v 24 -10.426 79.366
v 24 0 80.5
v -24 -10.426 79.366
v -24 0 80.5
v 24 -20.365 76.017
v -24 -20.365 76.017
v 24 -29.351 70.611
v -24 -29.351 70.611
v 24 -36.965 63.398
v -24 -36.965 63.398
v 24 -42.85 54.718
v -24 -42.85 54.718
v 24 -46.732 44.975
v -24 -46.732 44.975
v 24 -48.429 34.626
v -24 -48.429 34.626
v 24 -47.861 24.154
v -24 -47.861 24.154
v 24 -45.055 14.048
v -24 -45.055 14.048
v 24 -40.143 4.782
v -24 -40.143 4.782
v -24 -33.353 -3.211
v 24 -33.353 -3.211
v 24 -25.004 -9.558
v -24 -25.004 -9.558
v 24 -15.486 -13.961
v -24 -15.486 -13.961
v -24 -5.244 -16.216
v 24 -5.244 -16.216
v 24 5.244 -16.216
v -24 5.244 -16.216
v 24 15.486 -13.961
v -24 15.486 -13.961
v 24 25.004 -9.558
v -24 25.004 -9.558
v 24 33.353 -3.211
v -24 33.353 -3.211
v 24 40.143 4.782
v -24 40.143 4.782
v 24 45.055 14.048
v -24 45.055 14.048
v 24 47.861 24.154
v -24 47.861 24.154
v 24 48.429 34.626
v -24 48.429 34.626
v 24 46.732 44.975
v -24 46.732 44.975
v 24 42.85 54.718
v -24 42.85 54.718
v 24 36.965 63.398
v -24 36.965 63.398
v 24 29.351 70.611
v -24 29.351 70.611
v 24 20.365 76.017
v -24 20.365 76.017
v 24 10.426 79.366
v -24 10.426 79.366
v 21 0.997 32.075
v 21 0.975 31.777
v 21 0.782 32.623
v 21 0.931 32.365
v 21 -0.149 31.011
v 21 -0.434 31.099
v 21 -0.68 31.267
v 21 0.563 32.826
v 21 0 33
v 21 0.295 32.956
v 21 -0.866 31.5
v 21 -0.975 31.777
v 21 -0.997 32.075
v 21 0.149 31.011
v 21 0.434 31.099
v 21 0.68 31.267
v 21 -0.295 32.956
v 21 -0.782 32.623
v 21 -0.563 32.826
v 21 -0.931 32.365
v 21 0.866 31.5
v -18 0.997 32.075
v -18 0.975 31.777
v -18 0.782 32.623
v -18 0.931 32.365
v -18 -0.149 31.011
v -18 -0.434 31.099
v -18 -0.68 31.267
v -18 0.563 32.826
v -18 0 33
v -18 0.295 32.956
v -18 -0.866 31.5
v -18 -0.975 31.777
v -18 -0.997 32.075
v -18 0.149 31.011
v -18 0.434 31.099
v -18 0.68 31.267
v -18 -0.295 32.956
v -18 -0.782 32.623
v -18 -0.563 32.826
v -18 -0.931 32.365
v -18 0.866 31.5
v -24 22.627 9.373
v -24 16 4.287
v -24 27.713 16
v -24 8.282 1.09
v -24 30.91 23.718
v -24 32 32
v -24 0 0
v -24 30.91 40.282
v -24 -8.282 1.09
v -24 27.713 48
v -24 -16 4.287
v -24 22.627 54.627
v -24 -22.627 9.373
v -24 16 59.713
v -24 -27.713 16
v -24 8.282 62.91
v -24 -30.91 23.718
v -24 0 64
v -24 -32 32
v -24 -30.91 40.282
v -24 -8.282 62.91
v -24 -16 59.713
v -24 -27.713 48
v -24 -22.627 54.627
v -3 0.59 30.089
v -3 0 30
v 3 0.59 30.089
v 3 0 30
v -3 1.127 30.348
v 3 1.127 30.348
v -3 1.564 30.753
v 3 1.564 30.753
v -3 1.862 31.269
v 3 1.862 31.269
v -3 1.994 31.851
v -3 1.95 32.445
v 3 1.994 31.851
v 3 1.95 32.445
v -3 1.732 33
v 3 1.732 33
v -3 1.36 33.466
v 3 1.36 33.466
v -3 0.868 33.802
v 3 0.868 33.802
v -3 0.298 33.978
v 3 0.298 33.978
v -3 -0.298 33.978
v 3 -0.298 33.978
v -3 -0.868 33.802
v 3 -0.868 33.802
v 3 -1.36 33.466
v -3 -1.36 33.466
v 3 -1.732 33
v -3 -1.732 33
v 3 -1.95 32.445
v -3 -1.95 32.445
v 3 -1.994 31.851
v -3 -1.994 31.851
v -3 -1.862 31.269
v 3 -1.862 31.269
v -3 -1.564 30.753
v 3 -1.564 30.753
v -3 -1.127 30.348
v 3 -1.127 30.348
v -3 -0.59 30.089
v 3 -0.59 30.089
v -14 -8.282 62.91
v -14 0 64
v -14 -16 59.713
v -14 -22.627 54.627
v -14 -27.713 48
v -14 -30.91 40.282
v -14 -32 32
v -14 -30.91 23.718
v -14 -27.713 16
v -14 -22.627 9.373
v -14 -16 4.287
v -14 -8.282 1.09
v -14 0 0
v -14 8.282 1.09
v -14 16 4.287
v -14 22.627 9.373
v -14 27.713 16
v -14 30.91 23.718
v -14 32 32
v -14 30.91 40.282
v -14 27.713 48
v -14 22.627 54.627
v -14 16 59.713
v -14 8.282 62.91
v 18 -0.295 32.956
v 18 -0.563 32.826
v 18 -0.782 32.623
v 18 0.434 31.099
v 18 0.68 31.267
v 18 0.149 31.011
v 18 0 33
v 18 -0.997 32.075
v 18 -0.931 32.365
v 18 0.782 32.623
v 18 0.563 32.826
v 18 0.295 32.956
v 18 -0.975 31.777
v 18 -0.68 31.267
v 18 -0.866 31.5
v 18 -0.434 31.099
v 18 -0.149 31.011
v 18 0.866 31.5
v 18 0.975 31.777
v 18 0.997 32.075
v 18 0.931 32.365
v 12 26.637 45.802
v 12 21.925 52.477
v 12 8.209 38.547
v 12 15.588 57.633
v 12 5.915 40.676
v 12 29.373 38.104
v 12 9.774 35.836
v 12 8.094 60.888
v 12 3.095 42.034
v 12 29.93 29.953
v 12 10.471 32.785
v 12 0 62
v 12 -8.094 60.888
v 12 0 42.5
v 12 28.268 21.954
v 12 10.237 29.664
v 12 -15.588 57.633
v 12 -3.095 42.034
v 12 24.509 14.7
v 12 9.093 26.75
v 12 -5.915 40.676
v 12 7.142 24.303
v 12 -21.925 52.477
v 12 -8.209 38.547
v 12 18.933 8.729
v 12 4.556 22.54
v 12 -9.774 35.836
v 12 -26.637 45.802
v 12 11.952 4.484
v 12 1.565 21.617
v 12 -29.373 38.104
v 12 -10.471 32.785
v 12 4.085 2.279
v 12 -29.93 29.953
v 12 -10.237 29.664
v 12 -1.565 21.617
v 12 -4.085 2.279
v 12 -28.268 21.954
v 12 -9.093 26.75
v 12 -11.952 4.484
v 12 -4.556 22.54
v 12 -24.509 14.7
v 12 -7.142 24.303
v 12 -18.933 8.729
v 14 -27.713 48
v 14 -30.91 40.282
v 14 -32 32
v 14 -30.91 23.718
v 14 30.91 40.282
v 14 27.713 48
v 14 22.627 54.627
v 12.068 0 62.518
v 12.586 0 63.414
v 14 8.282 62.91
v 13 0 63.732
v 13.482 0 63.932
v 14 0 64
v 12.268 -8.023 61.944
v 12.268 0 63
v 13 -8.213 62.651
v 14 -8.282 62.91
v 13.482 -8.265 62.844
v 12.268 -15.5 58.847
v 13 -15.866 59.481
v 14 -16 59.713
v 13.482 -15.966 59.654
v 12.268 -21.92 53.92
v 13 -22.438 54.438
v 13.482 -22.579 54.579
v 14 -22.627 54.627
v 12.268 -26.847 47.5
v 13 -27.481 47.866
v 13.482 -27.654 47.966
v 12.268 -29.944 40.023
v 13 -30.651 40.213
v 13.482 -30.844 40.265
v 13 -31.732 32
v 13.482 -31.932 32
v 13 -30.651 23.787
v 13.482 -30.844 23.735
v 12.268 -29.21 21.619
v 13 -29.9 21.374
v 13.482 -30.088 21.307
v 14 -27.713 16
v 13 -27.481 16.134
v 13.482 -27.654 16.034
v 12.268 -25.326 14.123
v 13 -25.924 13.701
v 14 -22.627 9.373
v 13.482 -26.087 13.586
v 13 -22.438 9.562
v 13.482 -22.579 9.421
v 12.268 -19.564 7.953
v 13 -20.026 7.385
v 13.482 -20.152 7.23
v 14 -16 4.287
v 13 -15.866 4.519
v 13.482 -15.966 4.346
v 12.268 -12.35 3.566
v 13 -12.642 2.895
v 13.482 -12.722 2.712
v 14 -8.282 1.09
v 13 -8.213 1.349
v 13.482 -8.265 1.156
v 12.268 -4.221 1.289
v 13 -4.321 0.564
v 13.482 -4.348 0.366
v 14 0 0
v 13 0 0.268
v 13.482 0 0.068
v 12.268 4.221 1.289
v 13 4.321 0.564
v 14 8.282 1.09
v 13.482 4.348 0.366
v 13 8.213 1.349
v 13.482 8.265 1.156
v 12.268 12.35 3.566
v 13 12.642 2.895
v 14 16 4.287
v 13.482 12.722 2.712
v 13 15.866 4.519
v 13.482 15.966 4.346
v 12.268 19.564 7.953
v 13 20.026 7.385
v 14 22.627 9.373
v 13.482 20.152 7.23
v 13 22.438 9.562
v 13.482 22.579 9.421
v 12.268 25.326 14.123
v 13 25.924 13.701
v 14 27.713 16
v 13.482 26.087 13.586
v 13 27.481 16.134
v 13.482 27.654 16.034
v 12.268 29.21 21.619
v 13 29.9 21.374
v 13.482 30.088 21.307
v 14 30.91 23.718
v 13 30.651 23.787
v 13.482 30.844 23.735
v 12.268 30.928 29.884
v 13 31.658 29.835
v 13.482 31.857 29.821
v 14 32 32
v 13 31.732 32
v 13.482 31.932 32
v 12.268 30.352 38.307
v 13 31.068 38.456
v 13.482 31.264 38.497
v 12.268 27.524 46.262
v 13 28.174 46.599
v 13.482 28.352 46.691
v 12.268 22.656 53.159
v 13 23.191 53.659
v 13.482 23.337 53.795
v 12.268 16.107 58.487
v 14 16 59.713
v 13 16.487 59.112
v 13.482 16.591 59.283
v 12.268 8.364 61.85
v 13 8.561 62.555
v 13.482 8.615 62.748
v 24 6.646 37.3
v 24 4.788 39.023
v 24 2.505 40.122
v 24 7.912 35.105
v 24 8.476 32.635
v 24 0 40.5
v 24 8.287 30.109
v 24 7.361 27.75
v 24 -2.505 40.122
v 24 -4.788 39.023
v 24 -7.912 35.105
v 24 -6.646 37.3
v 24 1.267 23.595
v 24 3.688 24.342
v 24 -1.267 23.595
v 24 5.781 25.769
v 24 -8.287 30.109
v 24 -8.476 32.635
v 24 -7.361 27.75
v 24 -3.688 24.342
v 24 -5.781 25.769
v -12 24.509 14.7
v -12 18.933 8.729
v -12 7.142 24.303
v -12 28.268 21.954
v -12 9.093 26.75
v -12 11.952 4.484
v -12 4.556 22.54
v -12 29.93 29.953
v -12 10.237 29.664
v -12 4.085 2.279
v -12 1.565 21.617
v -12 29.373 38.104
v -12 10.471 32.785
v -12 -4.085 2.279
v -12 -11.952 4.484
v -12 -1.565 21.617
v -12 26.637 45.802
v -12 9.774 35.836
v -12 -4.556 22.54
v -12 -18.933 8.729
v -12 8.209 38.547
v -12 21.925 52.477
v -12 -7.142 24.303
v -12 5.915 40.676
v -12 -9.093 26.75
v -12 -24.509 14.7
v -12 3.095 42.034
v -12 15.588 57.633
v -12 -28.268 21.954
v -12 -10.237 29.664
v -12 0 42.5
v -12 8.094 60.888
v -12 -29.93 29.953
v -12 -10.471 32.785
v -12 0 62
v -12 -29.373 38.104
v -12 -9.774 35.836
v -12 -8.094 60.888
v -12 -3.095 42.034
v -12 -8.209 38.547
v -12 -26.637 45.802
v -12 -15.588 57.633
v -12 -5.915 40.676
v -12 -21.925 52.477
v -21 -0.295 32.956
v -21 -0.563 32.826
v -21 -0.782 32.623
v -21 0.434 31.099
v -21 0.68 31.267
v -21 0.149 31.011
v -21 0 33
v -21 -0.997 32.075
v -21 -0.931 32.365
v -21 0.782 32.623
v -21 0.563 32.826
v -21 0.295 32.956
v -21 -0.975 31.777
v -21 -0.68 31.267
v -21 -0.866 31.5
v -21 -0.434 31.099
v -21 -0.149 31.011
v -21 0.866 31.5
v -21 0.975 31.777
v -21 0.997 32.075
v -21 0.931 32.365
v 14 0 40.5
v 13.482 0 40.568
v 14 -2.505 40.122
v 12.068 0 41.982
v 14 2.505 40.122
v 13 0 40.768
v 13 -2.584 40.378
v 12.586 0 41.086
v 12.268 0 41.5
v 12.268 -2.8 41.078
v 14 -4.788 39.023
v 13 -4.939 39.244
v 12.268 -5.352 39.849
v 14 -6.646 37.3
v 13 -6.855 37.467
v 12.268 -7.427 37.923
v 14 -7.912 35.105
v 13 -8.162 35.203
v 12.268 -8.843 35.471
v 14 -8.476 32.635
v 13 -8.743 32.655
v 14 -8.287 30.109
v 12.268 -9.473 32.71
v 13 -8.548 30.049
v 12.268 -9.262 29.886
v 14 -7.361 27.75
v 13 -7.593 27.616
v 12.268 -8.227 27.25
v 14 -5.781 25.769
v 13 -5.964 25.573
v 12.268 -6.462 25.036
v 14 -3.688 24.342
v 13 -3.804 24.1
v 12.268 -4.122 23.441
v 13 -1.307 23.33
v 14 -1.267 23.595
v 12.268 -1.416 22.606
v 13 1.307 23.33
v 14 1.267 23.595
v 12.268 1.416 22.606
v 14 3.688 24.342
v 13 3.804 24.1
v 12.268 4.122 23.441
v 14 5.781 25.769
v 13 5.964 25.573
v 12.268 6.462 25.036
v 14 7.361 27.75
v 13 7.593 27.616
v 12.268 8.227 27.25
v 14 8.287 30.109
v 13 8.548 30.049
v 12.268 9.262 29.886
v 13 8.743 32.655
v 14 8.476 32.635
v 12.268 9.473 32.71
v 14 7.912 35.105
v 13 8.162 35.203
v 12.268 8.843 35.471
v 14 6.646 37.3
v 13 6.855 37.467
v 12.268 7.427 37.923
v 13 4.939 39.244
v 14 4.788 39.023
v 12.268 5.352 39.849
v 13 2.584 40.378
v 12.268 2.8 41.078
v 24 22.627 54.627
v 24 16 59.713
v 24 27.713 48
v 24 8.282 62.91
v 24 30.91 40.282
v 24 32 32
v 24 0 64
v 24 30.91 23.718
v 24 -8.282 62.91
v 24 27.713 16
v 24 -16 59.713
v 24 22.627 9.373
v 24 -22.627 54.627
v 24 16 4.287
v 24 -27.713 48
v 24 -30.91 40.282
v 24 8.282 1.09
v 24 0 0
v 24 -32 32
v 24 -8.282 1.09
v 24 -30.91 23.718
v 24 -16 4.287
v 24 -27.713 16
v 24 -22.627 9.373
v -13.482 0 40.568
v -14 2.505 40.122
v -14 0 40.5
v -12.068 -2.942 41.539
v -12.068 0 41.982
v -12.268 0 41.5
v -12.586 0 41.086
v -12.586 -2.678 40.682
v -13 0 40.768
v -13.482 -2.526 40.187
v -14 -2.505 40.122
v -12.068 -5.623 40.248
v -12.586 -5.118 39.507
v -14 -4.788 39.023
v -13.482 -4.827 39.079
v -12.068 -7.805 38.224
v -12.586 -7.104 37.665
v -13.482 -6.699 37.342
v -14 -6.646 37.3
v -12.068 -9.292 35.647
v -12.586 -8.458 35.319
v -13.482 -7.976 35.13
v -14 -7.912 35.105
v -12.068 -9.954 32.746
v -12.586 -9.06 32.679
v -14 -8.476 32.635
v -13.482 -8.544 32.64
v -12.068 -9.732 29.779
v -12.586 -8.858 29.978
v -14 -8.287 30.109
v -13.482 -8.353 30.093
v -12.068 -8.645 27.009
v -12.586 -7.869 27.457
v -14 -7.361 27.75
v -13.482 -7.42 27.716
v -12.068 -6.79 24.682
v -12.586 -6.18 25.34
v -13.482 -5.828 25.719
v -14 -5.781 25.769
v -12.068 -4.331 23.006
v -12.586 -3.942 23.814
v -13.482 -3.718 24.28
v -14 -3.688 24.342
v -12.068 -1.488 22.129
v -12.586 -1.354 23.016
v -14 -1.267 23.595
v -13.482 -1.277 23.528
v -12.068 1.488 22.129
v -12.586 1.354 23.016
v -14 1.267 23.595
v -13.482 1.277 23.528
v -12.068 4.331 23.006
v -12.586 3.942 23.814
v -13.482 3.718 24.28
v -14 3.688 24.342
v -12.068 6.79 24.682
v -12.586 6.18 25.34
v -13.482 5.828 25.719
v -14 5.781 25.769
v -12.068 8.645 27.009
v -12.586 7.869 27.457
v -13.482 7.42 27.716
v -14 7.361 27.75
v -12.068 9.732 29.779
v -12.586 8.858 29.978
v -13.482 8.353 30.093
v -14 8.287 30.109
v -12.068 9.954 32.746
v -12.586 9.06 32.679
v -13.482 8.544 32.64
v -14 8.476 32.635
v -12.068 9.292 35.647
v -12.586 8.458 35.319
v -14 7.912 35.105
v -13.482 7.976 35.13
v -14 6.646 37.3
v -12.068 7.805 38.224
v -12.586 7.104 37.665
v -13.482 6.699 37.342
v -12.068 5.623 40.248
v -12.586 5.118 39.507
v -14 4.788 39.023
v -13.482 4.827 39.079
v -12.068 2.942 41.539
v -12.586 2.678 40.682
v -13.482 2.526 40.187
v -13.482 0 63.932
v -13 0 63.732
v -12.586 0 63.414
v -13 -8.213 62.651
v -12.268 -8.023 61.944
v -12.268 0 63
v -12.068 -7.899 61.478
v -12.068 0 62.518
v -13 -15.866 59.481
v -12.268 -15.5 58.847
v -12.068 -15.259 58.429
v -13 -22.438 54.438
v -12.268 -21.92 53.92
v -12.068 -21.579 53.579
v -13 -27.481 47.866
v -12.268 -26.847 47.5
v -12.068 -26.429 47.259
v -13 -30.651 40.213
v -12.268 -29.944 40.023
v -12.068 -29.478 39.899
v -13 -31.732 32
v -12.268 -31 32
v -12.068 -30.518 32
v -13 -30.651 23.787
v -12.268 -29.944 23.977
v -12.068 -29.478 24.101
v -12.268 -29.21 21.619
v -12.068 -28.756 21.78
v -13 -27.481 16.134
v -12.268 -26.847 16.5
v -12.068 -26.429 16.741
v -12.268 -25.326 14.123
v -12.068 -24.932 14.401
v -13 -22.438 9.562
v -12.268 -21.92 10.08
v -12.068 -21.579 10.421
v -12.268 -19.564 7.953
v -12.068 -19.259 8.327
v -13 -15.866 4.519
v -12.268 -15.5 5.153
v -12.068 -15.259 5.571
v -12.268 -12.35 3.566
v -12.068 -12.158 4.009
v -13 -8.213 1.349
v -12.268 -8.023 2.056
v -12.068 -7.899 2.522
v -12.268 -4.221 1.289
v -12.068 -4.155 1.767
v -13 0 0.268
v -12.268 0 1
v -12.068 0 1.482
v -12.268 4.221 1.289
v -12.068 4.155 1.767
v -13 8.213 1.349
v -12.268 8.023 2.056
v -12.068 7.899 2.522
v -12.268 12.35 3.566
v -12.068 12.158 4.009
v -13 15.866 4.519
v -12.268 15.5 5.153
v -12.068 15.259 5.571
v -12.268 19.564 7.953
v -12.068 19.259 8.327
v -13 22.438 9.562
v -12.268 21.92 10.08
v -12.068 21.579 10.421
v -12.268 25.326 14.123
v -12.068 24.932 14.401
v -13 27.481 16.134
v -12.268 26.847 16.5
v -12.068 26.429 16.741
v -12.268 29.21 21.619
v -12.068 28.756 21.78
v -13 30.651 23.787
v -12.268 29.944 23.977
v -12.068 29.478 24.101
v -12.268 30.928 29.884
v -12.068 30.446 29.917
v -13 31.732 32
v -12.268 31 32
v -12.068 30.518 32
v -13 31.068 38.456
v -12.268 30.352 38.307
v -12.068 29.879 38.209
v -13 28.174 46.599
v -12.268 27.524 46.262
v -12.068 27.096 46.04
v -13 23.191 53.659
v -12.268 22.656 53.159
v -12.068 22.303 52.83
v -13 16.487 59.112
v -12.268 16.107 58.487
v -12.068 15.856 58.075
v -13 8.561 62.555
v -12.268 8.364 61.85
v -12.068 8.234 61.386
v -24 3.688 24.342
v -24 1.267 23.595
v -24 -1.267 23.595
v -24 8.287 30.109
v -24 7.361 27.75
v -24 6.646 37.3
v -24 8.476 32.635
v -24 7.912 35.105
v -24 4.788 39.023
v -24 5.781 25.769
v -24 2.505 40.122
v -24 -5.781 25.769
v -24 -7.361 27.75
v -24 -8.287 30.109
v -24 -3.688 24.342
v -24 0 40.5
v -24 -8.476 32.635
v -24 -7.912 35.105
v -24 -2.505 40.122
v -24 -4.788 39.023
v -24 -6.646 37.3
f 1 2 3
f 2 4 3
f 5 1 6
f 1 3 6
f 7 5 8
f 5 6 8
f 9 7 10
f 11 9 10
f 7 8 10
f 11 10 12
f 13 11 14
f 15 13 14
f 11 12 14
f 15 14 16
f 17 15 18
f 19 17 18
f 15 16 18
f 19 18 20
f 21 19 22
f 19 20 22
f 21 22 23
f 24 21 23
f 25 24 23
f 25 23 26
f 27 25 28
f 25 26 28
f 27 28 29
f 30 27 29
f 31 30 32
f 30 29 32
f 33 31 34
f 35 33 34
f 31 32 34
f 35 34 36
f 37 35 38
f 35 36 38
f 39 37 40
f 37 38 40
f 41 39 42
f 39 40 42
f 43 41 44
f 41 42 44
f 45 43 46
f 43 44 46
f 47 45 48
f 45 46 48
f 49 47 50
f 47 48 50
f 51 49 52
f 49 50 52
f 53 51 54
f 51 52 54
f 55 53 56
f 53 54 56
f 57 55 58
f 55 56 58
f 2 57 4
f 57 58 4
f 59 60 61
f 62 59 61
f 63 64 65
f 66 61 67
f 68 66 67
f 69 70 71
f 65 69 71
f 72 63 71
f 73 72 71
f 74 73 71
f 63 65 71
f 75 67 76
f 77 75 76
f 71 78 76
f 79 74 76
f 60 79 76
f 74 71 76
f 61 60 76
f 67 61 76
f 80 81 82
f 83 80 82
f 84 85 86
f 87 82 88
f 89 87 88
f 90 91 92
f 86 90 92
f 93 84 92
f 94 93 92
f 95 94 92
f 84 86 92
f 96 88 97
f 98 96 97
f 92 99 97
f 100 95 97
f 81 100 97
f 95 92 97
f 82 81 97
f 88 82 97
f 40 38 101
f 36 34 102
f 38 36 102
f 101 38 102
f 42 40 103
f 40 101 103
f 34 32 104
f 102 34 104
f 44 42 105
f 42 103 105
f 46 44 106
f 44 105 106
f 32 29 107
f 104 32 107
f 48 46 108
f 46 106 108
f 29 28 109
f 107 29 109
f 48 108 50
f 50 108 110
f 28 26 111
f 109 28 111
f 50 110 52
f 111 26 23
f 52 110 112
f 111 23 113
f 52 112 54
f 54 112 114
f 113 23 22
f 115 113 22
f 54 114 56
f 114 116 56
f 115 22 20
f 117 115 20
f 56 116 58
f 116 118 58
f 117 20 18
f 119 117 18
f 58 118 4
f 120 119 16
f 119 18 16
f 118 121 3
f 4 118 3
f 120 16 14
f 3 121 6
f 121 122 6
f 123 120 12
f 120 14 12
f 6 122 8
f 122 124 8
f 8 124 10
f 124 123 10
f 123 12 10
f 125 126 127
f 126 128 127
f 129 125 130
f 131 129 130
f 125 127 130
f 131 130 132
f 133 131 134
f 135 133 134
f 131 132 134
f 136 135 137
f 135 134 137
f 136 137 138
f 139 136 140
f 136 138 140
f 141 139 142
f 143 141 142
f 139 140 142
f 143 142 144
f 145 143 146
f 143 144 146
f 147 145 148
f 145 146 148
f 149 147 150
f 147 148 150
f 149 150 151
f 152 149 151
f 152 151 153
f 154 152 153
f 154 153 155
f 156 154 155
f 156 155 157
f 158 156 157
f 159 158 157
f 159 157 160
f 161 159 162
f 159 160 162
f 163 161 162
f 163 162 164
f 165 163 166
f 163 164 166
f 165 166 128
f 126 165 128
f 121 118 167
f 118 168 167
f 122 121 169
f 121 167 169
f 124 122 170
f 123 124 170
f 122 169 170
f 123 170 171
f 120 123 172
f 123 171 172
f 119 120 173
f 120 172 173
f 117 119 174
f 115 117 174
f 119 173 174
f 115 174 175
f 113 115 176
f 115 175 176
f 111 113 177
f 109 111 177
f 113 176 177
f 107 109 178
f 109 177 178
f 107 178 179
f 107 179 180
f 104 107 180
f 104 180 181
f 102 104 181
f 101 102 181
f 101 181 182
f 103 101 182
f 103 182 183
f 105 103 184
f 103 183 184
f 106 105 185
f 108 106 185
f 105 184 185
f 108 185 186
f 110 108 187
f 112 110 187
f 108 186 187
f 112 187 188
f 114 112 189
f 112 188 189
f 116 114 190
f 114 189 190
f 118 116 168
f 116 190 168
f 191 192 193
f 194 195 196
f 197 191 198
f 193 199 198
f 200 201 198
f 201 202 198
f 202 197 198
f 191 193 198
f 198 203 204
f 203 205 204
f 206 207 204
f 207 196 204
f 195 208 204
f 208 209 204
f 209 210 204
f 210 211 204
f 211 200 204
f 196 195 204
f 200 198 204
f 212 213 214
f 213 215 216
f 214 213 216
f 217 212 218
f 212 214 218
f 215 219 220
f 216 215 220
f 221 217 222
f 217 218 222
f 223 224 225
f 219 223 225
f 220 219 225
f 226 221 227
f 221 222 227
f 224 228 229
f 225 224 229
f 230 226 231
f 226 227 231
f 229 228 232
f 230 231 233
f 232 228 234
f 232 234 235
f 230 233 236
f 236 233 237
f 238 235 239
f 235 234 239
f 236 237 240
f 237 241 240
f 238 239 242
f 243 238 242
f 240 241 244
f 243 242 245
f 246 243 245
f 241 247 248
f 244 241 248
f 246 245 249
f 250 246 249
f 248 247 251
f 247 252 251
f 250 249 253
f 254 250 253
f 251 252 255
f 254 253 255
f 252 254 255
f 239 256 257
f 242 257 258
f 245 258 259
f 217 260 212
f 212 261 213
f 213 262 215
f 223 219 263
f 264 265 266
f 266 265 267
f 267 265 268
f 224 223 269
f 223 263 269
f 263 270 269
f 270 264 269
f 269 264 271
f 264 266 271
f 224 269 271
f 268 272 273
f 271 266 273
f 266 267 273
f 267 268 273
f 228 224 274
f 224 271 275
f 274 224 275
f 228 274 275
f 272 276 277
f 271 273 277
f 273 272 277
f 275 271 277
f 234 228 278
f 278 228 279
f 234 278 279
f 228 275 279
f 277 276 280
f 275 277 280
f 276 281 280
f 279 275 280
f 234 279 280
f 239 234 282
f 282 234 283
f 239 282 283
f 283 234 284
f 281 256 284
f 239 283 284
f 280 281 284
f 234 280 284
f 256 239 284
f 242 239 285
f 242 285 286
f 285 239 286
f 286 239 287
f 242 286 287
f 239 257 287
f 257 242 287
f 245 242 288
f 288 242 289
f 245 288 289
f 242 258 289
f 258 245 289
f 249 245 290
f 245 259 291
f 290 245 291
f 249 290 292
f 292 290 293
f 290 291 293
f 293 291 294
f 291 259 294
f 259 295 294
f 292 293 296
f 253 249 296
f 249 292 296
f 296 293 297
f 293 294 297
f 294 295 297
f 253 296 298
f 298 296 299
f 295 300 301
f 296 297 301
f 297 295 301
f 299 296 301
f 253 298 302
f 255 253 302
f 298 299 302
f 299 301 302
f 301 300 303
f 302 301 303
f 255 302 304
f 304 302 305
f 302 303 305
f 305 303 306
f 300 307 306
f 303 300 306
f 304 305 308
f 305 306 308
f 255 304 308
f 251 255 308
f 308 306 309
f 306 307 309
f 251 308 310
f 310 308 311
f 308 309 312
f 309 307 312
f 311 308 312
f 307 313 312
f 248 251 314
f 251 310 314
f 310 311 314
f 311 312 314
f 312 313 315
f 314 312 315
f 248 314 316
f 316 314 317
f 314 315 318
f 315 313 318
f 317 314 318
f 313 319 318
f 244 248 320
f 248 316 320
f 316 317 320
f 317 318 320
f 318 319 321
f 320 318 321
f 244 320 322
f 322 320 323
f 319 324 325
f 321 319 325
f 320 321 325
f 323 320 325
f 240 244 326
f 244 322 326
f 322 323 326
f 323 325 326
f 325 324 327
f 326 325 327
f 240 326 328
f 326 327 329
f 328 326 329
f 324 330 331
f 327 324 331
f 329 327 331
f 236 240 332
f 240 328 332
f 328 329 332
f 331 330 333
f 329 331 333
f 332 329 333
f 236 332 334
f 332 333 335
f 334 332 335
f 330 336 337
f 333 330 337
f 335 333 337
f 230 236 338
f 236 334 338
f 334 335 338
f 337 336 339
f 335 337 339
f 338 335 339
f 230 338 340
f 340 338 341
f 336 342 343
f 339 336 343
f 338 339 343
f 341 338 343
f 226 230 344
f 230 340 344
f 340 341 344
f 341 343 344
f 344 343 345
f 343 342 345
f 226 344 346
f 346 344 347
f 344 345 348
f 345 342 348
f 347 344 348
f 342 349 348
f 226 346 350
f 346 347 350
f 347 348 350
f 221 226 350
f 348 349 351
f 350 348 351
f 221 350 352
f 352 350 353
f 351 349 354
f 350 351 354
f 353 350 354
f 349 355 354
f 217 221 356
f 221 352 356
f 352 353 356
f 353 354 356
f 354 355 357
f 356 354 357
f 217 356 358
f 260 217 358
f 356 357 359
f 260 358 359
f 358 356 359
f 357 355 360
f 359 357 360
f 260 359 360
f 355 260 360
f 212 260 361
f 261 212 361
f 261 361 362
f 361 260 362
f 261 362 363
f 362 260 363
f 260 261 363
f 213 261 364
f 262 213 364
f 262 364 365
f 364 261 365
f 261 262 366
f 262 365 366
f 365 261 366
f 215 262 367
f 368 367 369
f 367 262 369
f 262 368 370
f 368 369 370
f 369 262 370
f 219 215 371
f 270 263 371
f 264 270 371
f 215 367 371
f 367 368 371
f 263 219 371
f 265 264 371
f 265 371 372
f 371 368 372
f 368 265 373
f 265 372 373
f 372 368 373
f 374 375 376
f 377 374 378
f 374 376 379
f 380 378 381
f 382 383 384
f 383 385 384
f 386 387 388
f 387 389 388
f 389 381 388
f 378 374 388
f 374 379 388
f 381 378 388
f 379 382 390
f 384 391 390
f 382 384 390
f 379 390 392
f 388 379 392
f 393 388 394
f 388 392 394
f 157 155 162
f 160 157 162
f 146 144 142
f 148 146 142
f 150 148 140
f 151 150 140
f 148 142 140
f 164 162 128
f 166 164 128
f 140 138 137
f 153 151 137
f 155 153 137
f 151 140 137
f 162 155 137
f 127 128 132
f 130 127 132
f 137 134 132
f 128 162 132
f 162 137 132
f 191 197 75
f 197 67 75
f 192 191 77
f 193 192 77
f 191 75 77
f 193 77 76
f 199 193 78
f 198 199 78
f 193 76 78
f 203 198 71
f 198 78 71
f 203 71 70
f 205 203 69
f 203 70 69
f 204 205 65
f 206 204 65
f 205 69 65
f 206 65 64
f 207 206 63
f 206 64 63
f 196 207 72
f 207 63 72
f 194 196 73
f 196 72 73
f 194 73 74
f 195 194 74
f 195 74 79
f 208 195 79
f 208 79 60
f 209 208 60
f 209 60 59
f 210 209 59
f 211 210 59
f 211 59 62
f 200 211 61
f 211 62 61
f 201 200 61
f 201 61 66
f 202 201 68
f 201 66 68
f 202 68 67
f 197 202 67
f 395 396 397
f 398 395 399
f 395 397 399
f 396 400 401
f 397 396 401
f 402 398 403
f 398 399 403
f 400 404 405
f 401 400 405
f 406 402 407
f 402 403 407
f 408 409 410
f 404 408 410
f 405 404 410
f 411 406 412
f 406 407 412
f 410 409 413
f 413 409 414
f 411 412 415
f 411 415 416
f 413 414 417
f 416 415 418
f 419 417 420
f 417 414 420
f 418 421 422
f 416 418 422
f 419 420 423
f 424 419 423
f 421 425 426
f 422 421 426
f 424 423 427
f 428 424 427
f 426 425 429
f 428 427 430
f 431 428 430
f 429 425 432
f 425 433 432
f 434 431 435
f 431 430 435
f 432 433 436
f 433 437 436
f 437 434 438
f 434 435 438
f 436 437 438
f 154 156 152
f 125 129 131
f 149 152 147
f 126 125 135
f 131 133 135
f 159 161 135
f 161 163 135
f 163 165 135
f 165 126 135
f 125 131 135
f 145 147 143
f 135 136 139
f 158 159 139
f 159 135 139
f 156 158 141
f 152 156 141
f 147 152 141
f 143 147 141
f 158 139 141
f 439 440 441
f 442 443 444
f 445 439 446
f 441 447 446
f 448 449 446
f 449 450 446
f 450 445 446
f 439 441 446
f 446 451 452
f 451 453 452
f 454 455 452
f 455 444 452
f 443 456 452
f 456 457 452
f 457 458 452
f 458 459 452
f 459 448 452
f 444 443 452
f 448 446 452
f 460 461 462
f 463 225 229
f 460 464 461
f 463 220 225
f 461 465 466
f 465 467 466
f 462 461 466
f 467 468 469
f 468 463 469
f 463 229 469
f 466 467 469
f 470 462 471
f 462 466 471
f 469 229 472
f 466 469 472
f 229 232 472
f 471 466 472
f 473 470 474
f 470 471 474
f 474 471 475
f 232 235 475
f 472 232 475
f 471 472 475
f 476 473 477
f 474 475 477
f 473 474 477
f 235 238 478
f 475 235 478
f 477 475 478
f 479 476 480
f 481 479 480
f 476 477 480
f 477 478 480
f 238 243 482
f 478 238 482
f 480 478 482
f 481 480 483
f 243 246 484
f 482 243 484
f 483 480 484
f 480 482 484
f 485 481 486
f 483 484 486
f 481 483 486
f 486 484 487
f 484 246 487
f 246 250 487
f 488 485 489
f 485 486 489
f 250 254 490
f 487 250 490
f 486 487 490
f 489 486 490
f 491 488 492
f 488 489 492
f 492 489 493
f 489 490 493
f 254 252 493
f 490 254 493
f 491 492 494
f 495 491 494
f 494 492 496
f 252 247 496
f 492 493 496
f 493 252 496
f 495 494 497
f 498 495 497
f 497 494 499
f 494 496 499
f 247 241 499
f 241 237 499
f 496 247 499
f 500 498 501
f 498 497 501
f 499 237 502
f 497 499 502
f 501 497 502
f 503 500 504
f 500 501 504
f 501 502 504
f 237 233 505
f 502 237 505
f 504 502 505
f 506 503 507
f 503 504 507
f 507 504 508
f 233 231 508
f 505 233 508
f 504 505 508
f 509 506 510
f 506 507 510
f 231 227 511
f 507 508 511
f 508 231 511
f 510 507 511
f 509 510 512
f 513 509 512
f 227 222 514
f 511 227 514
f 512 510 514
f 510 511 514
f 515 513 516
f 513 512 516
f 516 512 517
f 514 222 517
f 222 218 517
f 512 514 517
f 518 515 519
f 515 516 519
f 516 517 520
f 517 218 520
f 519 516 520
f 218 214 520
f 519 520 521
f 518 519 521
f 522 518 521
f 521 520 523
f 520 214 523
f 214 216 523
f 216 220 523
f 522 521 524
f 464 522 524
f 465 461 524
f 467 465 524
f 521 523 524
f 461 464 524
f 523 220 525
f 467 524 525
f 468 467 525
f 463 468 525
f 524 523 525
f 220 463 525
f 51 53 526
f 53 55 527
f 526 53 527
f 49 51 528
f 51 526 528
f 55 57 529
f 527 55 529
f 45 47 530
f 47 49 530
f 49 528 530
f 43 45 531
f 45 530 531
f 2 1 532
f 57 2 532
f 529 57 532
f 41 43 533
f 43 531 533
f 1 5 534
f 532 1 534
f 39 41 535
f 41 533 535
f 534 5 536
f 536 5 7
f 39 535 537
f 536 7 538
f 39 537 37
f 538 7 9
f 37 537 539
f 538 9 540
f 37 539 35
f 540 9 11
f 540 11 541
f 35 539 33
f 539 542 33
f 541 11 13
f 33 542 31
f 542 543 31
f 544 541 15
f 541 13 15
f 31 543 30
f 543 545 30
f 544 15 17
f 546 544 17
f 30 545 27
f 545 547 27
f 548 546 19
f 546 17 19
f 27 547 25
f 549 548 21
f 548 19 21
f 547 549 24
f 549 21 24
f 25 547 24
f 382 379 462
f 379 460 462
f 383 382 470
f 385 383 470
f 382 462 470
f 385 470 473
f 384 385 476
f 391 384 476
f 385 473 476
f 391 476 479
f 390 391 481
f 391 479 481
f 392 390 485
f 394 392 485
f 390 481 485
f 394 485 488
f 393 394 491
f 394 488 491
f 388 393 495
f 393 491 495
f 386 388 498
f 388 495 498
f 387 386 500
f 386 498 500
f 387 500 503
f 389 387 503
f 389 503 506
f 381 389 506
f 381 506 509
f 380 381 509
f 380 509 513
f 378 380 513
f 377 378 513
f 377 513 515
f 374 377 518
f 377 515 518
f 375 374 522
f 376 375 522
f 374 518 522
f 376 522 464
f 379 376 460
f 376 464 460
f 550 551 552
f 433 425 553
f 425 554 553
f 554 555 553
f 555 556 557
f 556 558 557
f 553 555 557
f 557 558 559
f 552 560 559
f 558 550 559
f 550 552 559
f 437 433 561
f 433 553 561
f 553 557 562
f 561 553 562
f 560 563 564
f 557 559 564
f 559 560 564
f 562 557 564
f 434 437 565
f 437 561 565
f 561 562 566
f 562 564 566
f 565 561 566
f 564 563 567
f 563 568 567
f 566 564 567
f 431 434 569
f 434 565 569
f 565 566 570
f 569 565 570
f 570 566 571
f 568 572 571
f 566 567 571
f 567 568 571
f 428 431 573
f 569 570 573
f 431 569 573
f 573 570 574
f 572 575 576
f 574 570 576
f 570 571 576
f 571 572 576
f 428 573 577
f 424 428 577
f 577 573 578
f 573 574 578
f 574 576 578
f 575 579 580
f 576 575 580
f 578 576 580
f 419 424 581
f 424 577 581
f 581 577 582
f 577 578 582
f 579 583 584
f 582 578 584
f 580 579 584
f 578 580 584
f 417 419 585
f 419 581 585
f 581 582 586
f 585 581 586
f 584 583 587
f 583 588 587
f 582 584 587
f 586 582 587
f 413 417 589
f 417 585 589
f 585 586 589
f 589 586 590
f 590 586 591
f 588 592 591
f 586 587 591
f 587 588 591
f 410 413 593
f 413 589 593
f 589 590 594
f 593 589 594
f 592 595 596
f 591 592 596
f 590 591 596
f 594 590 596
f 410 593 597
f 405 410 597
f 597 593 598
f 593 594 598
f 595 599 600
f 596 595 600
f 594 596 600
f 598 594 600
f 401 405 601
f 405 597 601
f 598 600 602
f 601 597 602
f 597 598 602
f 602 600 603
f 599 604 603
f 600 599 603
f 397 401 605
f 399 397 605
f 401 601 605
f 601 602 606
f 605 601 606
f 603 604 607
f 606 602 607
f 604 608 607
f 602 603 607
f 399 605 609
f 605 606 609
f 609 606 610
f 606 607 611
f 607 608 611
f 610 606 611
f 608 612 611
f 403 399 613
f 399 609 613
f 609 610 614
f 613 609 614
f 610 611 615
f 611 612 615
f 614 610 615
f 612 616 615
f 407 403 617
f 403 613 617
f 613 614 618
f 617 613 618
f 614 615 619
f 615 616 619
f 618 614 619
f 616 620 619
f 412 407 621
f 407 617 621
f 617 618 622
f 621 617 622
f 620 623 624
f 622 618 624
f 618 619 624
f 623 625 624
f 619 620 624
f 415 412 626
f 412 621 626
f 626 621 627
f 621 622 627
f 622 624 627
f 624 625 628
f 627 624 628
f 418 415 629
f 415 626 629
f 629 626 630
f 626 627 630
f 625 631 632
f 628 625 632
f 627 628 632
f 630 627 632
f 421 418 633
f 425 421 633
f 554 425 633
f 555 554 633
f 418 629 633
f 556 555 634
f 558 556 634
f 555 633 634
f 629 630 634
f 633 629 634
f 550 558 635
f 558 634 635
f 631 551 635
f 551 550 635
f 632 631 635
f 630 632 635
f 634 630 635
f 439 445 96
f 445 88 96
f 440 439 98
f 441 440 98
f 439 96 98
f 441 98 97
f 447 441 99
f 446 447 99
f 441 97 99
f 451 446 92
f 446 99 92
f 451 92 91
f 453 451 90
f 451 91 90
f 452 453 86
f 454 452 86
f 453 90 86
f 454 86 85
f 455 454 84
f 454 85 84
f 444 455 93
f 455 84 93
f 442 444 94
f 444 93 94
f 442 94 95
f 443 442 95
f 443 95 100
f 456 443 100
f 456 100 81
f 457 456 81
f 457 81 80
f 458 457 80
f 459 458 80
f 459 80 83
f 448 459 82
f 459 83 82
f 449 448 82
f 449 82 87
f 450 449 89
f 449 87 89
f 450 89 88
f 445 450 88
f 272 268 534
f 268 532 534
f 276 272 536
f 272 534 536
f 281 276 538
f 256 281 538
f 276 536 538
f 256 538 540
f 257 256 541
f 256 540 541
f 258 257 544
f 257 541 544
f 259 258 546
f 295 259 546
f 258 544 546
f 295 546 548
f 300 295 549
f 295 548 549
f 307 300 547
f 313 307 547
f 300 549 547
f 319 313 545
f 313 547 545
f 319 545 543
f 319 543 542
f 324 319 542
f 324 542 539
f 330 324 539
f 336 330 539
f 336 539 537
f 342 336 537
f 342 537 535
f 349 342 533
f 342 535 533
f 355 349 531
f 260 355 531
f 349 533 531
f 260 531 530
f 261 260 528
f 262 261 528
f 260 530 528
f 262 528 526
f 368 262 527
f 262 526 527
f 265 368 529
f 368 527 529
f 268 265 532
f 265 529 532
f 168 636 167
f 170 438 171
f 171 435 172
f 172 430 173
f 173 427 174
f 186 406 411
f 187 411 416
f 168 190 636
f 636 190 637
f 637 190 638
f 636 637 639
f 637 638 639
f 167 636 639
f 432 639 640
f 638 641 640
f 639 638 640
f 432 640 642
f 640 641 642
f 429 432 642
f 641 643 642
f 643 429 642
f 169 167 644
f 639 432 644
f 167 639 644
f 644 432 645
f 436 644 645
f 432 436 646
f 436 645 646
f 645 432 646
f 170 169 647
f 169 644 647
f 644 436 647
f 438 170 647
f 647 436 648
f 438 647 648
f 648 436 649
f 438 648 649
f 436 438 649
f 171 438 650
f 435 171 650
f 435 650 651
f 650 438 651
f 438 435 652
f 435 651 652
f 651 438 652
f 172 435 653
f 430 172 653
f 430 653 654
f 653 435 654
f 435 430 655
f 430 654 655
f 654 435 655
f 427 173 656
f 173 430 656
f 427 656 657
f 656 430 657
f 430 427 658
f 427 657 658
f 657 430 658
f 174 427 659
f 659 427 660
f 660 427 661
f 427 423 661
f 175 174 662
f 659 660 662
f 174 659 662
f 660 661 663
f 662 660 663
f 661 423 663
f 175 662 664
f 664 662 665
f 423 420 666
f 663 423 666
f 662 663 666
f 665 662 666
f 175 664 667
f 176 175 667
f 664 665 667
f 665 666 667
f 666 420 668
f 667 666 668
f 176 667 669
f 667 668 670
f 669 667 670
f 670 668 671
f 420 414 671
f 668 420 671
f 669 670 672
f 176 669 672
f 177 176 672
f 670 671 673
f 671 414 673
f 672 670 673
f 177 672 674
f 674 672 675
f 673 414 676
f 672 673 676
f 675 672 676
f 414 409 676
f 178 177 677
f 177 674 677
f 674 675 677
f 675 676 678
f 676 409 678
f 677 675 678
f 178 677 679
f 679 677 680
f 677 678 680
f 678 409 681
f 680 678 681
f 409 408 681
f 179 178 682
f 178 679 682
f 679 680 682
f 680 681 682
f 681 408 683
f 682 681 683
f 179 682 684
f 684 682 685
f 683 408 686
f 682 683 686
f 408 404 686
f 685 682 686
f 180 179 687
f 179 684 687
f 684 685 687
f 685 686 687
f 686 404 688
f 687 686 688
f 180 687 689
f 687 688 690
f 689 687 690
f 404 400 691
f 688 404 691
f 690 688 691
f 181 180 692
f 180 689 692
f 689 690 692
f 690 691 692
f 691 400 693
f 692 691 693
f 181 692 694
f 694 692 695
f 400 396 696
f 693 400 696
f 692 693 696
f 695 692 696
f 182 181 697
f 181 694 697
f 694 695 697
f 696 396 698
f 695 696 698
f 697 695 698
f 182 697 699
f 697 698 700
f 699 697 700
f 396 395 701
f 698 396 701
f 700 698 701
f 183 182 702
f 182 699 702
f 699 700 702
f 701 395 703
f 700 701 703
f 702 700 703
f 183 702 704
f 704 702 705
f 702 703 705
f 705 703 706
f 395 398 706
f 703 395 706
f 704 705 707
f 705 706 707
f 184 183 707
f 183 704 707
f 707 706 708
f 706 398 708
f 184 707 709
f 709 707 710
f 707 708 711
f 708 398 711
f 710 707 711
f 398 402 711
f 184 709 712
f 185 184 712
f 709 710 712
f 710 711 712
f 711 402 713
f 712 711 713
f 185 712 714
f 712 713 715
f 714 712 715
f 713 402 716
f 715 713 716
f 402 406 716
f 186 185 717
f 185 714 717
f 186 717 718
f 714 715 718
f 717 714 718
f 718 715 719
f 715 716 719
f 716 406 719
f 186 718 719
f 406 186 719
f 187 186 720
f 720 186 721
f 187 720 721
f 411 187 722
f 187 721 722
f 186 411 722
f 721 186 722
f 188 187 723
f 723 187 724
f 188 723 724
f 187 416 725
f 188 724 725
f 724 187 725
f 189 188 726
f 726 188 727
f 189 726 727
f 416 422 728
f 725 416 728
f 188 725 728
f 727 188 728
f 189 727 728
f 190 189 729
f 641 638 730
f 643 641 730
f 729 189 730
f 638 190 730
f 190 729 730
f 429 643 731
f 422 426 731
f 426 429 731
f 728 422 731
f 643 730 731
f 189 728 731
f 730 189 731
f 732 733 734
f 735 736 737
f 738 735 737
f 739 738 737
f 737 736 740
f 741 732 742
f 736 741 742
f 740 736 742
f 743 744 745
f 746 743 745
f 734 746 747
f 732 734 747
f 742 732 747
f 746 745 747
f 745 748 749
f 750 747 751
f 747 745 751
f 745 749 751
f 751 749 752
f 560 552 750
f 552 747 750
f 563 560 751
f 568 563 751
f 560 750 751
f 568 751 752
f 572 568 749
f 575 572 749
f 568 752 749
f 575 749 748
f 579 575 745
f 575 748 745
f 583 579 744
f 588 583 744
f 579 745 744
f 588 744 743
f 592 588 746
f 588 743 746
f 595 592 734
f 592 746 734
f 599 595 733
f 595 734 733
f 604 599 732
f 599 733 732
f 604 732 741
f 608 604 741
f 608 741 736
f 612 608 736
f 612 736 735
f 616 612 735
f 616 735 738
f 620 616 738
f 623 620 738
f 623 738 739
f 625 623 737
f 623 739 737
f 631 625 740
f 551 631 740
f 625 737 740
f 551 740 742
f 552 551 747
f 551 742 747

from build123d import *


with BuildPart() as f1:
    # F0 (on Front) → F1 (revolve)
    with BuildSketch(Plane.XZ):
        with BuildLine():
            Line((-3, 32), (-3, 30))
            Line((-3, 30), (0, 30))
            Line((0, 30), (3, 30))
            Line((3, 30), (3, 32))
            Line((3, 32), (18, 32))
            Line((18, 32), (18, 33))
            Line((18, 33), (21, 33))
            Line((21, 33), (21, 32))
            Line((21, 32), (24, 32))
            Line((24, 32), (24, 40.5))
            Line((24, 40.5), (14, 40.5))
            ThreePointArc((14, 40.5), (12.585786, 41.085786), (12, 42.5))
            Line((12, 42.5), (12, 62))
            ThreePointArc((12, 62), (12.585786, 63.414214), (14, 64))
            Line((14, 64), (24, 64))
            Line((24, 64), (24, 80.5))
            Line((24, 80.5), (0, 80.5))
            Line((0, 80.5), (-24, 80.5))
            Line((-24, 80.5), (-24, 64))
            Line((-24, 64), (-14, 64))
            ThreePointArc((-14, 64), (-12.585786, 63.414214), (-12, 62))
            Line((-12, 62), (-12, 42.5))
            ThreePointArc((-12, 42.5), (-12.585786, 41.085786), (-14, 40.5))
            Line((-14, 40.5), (-24, 40.5))
            Line((-24, 40.5), (-24, 32))
            Line((-24, 32), (-21, 32))
            Line((-21, 32), (-21, 33))
            Line((-21, 33), (-18, 33))
            Line((-18, 33), (-18, 32))
            Line((-18, 32), (-3, 32))
        make_face()
    revolve(axis=Axis((10.5, 0, 32), (1, 0, 0)))


solid = f1.part
